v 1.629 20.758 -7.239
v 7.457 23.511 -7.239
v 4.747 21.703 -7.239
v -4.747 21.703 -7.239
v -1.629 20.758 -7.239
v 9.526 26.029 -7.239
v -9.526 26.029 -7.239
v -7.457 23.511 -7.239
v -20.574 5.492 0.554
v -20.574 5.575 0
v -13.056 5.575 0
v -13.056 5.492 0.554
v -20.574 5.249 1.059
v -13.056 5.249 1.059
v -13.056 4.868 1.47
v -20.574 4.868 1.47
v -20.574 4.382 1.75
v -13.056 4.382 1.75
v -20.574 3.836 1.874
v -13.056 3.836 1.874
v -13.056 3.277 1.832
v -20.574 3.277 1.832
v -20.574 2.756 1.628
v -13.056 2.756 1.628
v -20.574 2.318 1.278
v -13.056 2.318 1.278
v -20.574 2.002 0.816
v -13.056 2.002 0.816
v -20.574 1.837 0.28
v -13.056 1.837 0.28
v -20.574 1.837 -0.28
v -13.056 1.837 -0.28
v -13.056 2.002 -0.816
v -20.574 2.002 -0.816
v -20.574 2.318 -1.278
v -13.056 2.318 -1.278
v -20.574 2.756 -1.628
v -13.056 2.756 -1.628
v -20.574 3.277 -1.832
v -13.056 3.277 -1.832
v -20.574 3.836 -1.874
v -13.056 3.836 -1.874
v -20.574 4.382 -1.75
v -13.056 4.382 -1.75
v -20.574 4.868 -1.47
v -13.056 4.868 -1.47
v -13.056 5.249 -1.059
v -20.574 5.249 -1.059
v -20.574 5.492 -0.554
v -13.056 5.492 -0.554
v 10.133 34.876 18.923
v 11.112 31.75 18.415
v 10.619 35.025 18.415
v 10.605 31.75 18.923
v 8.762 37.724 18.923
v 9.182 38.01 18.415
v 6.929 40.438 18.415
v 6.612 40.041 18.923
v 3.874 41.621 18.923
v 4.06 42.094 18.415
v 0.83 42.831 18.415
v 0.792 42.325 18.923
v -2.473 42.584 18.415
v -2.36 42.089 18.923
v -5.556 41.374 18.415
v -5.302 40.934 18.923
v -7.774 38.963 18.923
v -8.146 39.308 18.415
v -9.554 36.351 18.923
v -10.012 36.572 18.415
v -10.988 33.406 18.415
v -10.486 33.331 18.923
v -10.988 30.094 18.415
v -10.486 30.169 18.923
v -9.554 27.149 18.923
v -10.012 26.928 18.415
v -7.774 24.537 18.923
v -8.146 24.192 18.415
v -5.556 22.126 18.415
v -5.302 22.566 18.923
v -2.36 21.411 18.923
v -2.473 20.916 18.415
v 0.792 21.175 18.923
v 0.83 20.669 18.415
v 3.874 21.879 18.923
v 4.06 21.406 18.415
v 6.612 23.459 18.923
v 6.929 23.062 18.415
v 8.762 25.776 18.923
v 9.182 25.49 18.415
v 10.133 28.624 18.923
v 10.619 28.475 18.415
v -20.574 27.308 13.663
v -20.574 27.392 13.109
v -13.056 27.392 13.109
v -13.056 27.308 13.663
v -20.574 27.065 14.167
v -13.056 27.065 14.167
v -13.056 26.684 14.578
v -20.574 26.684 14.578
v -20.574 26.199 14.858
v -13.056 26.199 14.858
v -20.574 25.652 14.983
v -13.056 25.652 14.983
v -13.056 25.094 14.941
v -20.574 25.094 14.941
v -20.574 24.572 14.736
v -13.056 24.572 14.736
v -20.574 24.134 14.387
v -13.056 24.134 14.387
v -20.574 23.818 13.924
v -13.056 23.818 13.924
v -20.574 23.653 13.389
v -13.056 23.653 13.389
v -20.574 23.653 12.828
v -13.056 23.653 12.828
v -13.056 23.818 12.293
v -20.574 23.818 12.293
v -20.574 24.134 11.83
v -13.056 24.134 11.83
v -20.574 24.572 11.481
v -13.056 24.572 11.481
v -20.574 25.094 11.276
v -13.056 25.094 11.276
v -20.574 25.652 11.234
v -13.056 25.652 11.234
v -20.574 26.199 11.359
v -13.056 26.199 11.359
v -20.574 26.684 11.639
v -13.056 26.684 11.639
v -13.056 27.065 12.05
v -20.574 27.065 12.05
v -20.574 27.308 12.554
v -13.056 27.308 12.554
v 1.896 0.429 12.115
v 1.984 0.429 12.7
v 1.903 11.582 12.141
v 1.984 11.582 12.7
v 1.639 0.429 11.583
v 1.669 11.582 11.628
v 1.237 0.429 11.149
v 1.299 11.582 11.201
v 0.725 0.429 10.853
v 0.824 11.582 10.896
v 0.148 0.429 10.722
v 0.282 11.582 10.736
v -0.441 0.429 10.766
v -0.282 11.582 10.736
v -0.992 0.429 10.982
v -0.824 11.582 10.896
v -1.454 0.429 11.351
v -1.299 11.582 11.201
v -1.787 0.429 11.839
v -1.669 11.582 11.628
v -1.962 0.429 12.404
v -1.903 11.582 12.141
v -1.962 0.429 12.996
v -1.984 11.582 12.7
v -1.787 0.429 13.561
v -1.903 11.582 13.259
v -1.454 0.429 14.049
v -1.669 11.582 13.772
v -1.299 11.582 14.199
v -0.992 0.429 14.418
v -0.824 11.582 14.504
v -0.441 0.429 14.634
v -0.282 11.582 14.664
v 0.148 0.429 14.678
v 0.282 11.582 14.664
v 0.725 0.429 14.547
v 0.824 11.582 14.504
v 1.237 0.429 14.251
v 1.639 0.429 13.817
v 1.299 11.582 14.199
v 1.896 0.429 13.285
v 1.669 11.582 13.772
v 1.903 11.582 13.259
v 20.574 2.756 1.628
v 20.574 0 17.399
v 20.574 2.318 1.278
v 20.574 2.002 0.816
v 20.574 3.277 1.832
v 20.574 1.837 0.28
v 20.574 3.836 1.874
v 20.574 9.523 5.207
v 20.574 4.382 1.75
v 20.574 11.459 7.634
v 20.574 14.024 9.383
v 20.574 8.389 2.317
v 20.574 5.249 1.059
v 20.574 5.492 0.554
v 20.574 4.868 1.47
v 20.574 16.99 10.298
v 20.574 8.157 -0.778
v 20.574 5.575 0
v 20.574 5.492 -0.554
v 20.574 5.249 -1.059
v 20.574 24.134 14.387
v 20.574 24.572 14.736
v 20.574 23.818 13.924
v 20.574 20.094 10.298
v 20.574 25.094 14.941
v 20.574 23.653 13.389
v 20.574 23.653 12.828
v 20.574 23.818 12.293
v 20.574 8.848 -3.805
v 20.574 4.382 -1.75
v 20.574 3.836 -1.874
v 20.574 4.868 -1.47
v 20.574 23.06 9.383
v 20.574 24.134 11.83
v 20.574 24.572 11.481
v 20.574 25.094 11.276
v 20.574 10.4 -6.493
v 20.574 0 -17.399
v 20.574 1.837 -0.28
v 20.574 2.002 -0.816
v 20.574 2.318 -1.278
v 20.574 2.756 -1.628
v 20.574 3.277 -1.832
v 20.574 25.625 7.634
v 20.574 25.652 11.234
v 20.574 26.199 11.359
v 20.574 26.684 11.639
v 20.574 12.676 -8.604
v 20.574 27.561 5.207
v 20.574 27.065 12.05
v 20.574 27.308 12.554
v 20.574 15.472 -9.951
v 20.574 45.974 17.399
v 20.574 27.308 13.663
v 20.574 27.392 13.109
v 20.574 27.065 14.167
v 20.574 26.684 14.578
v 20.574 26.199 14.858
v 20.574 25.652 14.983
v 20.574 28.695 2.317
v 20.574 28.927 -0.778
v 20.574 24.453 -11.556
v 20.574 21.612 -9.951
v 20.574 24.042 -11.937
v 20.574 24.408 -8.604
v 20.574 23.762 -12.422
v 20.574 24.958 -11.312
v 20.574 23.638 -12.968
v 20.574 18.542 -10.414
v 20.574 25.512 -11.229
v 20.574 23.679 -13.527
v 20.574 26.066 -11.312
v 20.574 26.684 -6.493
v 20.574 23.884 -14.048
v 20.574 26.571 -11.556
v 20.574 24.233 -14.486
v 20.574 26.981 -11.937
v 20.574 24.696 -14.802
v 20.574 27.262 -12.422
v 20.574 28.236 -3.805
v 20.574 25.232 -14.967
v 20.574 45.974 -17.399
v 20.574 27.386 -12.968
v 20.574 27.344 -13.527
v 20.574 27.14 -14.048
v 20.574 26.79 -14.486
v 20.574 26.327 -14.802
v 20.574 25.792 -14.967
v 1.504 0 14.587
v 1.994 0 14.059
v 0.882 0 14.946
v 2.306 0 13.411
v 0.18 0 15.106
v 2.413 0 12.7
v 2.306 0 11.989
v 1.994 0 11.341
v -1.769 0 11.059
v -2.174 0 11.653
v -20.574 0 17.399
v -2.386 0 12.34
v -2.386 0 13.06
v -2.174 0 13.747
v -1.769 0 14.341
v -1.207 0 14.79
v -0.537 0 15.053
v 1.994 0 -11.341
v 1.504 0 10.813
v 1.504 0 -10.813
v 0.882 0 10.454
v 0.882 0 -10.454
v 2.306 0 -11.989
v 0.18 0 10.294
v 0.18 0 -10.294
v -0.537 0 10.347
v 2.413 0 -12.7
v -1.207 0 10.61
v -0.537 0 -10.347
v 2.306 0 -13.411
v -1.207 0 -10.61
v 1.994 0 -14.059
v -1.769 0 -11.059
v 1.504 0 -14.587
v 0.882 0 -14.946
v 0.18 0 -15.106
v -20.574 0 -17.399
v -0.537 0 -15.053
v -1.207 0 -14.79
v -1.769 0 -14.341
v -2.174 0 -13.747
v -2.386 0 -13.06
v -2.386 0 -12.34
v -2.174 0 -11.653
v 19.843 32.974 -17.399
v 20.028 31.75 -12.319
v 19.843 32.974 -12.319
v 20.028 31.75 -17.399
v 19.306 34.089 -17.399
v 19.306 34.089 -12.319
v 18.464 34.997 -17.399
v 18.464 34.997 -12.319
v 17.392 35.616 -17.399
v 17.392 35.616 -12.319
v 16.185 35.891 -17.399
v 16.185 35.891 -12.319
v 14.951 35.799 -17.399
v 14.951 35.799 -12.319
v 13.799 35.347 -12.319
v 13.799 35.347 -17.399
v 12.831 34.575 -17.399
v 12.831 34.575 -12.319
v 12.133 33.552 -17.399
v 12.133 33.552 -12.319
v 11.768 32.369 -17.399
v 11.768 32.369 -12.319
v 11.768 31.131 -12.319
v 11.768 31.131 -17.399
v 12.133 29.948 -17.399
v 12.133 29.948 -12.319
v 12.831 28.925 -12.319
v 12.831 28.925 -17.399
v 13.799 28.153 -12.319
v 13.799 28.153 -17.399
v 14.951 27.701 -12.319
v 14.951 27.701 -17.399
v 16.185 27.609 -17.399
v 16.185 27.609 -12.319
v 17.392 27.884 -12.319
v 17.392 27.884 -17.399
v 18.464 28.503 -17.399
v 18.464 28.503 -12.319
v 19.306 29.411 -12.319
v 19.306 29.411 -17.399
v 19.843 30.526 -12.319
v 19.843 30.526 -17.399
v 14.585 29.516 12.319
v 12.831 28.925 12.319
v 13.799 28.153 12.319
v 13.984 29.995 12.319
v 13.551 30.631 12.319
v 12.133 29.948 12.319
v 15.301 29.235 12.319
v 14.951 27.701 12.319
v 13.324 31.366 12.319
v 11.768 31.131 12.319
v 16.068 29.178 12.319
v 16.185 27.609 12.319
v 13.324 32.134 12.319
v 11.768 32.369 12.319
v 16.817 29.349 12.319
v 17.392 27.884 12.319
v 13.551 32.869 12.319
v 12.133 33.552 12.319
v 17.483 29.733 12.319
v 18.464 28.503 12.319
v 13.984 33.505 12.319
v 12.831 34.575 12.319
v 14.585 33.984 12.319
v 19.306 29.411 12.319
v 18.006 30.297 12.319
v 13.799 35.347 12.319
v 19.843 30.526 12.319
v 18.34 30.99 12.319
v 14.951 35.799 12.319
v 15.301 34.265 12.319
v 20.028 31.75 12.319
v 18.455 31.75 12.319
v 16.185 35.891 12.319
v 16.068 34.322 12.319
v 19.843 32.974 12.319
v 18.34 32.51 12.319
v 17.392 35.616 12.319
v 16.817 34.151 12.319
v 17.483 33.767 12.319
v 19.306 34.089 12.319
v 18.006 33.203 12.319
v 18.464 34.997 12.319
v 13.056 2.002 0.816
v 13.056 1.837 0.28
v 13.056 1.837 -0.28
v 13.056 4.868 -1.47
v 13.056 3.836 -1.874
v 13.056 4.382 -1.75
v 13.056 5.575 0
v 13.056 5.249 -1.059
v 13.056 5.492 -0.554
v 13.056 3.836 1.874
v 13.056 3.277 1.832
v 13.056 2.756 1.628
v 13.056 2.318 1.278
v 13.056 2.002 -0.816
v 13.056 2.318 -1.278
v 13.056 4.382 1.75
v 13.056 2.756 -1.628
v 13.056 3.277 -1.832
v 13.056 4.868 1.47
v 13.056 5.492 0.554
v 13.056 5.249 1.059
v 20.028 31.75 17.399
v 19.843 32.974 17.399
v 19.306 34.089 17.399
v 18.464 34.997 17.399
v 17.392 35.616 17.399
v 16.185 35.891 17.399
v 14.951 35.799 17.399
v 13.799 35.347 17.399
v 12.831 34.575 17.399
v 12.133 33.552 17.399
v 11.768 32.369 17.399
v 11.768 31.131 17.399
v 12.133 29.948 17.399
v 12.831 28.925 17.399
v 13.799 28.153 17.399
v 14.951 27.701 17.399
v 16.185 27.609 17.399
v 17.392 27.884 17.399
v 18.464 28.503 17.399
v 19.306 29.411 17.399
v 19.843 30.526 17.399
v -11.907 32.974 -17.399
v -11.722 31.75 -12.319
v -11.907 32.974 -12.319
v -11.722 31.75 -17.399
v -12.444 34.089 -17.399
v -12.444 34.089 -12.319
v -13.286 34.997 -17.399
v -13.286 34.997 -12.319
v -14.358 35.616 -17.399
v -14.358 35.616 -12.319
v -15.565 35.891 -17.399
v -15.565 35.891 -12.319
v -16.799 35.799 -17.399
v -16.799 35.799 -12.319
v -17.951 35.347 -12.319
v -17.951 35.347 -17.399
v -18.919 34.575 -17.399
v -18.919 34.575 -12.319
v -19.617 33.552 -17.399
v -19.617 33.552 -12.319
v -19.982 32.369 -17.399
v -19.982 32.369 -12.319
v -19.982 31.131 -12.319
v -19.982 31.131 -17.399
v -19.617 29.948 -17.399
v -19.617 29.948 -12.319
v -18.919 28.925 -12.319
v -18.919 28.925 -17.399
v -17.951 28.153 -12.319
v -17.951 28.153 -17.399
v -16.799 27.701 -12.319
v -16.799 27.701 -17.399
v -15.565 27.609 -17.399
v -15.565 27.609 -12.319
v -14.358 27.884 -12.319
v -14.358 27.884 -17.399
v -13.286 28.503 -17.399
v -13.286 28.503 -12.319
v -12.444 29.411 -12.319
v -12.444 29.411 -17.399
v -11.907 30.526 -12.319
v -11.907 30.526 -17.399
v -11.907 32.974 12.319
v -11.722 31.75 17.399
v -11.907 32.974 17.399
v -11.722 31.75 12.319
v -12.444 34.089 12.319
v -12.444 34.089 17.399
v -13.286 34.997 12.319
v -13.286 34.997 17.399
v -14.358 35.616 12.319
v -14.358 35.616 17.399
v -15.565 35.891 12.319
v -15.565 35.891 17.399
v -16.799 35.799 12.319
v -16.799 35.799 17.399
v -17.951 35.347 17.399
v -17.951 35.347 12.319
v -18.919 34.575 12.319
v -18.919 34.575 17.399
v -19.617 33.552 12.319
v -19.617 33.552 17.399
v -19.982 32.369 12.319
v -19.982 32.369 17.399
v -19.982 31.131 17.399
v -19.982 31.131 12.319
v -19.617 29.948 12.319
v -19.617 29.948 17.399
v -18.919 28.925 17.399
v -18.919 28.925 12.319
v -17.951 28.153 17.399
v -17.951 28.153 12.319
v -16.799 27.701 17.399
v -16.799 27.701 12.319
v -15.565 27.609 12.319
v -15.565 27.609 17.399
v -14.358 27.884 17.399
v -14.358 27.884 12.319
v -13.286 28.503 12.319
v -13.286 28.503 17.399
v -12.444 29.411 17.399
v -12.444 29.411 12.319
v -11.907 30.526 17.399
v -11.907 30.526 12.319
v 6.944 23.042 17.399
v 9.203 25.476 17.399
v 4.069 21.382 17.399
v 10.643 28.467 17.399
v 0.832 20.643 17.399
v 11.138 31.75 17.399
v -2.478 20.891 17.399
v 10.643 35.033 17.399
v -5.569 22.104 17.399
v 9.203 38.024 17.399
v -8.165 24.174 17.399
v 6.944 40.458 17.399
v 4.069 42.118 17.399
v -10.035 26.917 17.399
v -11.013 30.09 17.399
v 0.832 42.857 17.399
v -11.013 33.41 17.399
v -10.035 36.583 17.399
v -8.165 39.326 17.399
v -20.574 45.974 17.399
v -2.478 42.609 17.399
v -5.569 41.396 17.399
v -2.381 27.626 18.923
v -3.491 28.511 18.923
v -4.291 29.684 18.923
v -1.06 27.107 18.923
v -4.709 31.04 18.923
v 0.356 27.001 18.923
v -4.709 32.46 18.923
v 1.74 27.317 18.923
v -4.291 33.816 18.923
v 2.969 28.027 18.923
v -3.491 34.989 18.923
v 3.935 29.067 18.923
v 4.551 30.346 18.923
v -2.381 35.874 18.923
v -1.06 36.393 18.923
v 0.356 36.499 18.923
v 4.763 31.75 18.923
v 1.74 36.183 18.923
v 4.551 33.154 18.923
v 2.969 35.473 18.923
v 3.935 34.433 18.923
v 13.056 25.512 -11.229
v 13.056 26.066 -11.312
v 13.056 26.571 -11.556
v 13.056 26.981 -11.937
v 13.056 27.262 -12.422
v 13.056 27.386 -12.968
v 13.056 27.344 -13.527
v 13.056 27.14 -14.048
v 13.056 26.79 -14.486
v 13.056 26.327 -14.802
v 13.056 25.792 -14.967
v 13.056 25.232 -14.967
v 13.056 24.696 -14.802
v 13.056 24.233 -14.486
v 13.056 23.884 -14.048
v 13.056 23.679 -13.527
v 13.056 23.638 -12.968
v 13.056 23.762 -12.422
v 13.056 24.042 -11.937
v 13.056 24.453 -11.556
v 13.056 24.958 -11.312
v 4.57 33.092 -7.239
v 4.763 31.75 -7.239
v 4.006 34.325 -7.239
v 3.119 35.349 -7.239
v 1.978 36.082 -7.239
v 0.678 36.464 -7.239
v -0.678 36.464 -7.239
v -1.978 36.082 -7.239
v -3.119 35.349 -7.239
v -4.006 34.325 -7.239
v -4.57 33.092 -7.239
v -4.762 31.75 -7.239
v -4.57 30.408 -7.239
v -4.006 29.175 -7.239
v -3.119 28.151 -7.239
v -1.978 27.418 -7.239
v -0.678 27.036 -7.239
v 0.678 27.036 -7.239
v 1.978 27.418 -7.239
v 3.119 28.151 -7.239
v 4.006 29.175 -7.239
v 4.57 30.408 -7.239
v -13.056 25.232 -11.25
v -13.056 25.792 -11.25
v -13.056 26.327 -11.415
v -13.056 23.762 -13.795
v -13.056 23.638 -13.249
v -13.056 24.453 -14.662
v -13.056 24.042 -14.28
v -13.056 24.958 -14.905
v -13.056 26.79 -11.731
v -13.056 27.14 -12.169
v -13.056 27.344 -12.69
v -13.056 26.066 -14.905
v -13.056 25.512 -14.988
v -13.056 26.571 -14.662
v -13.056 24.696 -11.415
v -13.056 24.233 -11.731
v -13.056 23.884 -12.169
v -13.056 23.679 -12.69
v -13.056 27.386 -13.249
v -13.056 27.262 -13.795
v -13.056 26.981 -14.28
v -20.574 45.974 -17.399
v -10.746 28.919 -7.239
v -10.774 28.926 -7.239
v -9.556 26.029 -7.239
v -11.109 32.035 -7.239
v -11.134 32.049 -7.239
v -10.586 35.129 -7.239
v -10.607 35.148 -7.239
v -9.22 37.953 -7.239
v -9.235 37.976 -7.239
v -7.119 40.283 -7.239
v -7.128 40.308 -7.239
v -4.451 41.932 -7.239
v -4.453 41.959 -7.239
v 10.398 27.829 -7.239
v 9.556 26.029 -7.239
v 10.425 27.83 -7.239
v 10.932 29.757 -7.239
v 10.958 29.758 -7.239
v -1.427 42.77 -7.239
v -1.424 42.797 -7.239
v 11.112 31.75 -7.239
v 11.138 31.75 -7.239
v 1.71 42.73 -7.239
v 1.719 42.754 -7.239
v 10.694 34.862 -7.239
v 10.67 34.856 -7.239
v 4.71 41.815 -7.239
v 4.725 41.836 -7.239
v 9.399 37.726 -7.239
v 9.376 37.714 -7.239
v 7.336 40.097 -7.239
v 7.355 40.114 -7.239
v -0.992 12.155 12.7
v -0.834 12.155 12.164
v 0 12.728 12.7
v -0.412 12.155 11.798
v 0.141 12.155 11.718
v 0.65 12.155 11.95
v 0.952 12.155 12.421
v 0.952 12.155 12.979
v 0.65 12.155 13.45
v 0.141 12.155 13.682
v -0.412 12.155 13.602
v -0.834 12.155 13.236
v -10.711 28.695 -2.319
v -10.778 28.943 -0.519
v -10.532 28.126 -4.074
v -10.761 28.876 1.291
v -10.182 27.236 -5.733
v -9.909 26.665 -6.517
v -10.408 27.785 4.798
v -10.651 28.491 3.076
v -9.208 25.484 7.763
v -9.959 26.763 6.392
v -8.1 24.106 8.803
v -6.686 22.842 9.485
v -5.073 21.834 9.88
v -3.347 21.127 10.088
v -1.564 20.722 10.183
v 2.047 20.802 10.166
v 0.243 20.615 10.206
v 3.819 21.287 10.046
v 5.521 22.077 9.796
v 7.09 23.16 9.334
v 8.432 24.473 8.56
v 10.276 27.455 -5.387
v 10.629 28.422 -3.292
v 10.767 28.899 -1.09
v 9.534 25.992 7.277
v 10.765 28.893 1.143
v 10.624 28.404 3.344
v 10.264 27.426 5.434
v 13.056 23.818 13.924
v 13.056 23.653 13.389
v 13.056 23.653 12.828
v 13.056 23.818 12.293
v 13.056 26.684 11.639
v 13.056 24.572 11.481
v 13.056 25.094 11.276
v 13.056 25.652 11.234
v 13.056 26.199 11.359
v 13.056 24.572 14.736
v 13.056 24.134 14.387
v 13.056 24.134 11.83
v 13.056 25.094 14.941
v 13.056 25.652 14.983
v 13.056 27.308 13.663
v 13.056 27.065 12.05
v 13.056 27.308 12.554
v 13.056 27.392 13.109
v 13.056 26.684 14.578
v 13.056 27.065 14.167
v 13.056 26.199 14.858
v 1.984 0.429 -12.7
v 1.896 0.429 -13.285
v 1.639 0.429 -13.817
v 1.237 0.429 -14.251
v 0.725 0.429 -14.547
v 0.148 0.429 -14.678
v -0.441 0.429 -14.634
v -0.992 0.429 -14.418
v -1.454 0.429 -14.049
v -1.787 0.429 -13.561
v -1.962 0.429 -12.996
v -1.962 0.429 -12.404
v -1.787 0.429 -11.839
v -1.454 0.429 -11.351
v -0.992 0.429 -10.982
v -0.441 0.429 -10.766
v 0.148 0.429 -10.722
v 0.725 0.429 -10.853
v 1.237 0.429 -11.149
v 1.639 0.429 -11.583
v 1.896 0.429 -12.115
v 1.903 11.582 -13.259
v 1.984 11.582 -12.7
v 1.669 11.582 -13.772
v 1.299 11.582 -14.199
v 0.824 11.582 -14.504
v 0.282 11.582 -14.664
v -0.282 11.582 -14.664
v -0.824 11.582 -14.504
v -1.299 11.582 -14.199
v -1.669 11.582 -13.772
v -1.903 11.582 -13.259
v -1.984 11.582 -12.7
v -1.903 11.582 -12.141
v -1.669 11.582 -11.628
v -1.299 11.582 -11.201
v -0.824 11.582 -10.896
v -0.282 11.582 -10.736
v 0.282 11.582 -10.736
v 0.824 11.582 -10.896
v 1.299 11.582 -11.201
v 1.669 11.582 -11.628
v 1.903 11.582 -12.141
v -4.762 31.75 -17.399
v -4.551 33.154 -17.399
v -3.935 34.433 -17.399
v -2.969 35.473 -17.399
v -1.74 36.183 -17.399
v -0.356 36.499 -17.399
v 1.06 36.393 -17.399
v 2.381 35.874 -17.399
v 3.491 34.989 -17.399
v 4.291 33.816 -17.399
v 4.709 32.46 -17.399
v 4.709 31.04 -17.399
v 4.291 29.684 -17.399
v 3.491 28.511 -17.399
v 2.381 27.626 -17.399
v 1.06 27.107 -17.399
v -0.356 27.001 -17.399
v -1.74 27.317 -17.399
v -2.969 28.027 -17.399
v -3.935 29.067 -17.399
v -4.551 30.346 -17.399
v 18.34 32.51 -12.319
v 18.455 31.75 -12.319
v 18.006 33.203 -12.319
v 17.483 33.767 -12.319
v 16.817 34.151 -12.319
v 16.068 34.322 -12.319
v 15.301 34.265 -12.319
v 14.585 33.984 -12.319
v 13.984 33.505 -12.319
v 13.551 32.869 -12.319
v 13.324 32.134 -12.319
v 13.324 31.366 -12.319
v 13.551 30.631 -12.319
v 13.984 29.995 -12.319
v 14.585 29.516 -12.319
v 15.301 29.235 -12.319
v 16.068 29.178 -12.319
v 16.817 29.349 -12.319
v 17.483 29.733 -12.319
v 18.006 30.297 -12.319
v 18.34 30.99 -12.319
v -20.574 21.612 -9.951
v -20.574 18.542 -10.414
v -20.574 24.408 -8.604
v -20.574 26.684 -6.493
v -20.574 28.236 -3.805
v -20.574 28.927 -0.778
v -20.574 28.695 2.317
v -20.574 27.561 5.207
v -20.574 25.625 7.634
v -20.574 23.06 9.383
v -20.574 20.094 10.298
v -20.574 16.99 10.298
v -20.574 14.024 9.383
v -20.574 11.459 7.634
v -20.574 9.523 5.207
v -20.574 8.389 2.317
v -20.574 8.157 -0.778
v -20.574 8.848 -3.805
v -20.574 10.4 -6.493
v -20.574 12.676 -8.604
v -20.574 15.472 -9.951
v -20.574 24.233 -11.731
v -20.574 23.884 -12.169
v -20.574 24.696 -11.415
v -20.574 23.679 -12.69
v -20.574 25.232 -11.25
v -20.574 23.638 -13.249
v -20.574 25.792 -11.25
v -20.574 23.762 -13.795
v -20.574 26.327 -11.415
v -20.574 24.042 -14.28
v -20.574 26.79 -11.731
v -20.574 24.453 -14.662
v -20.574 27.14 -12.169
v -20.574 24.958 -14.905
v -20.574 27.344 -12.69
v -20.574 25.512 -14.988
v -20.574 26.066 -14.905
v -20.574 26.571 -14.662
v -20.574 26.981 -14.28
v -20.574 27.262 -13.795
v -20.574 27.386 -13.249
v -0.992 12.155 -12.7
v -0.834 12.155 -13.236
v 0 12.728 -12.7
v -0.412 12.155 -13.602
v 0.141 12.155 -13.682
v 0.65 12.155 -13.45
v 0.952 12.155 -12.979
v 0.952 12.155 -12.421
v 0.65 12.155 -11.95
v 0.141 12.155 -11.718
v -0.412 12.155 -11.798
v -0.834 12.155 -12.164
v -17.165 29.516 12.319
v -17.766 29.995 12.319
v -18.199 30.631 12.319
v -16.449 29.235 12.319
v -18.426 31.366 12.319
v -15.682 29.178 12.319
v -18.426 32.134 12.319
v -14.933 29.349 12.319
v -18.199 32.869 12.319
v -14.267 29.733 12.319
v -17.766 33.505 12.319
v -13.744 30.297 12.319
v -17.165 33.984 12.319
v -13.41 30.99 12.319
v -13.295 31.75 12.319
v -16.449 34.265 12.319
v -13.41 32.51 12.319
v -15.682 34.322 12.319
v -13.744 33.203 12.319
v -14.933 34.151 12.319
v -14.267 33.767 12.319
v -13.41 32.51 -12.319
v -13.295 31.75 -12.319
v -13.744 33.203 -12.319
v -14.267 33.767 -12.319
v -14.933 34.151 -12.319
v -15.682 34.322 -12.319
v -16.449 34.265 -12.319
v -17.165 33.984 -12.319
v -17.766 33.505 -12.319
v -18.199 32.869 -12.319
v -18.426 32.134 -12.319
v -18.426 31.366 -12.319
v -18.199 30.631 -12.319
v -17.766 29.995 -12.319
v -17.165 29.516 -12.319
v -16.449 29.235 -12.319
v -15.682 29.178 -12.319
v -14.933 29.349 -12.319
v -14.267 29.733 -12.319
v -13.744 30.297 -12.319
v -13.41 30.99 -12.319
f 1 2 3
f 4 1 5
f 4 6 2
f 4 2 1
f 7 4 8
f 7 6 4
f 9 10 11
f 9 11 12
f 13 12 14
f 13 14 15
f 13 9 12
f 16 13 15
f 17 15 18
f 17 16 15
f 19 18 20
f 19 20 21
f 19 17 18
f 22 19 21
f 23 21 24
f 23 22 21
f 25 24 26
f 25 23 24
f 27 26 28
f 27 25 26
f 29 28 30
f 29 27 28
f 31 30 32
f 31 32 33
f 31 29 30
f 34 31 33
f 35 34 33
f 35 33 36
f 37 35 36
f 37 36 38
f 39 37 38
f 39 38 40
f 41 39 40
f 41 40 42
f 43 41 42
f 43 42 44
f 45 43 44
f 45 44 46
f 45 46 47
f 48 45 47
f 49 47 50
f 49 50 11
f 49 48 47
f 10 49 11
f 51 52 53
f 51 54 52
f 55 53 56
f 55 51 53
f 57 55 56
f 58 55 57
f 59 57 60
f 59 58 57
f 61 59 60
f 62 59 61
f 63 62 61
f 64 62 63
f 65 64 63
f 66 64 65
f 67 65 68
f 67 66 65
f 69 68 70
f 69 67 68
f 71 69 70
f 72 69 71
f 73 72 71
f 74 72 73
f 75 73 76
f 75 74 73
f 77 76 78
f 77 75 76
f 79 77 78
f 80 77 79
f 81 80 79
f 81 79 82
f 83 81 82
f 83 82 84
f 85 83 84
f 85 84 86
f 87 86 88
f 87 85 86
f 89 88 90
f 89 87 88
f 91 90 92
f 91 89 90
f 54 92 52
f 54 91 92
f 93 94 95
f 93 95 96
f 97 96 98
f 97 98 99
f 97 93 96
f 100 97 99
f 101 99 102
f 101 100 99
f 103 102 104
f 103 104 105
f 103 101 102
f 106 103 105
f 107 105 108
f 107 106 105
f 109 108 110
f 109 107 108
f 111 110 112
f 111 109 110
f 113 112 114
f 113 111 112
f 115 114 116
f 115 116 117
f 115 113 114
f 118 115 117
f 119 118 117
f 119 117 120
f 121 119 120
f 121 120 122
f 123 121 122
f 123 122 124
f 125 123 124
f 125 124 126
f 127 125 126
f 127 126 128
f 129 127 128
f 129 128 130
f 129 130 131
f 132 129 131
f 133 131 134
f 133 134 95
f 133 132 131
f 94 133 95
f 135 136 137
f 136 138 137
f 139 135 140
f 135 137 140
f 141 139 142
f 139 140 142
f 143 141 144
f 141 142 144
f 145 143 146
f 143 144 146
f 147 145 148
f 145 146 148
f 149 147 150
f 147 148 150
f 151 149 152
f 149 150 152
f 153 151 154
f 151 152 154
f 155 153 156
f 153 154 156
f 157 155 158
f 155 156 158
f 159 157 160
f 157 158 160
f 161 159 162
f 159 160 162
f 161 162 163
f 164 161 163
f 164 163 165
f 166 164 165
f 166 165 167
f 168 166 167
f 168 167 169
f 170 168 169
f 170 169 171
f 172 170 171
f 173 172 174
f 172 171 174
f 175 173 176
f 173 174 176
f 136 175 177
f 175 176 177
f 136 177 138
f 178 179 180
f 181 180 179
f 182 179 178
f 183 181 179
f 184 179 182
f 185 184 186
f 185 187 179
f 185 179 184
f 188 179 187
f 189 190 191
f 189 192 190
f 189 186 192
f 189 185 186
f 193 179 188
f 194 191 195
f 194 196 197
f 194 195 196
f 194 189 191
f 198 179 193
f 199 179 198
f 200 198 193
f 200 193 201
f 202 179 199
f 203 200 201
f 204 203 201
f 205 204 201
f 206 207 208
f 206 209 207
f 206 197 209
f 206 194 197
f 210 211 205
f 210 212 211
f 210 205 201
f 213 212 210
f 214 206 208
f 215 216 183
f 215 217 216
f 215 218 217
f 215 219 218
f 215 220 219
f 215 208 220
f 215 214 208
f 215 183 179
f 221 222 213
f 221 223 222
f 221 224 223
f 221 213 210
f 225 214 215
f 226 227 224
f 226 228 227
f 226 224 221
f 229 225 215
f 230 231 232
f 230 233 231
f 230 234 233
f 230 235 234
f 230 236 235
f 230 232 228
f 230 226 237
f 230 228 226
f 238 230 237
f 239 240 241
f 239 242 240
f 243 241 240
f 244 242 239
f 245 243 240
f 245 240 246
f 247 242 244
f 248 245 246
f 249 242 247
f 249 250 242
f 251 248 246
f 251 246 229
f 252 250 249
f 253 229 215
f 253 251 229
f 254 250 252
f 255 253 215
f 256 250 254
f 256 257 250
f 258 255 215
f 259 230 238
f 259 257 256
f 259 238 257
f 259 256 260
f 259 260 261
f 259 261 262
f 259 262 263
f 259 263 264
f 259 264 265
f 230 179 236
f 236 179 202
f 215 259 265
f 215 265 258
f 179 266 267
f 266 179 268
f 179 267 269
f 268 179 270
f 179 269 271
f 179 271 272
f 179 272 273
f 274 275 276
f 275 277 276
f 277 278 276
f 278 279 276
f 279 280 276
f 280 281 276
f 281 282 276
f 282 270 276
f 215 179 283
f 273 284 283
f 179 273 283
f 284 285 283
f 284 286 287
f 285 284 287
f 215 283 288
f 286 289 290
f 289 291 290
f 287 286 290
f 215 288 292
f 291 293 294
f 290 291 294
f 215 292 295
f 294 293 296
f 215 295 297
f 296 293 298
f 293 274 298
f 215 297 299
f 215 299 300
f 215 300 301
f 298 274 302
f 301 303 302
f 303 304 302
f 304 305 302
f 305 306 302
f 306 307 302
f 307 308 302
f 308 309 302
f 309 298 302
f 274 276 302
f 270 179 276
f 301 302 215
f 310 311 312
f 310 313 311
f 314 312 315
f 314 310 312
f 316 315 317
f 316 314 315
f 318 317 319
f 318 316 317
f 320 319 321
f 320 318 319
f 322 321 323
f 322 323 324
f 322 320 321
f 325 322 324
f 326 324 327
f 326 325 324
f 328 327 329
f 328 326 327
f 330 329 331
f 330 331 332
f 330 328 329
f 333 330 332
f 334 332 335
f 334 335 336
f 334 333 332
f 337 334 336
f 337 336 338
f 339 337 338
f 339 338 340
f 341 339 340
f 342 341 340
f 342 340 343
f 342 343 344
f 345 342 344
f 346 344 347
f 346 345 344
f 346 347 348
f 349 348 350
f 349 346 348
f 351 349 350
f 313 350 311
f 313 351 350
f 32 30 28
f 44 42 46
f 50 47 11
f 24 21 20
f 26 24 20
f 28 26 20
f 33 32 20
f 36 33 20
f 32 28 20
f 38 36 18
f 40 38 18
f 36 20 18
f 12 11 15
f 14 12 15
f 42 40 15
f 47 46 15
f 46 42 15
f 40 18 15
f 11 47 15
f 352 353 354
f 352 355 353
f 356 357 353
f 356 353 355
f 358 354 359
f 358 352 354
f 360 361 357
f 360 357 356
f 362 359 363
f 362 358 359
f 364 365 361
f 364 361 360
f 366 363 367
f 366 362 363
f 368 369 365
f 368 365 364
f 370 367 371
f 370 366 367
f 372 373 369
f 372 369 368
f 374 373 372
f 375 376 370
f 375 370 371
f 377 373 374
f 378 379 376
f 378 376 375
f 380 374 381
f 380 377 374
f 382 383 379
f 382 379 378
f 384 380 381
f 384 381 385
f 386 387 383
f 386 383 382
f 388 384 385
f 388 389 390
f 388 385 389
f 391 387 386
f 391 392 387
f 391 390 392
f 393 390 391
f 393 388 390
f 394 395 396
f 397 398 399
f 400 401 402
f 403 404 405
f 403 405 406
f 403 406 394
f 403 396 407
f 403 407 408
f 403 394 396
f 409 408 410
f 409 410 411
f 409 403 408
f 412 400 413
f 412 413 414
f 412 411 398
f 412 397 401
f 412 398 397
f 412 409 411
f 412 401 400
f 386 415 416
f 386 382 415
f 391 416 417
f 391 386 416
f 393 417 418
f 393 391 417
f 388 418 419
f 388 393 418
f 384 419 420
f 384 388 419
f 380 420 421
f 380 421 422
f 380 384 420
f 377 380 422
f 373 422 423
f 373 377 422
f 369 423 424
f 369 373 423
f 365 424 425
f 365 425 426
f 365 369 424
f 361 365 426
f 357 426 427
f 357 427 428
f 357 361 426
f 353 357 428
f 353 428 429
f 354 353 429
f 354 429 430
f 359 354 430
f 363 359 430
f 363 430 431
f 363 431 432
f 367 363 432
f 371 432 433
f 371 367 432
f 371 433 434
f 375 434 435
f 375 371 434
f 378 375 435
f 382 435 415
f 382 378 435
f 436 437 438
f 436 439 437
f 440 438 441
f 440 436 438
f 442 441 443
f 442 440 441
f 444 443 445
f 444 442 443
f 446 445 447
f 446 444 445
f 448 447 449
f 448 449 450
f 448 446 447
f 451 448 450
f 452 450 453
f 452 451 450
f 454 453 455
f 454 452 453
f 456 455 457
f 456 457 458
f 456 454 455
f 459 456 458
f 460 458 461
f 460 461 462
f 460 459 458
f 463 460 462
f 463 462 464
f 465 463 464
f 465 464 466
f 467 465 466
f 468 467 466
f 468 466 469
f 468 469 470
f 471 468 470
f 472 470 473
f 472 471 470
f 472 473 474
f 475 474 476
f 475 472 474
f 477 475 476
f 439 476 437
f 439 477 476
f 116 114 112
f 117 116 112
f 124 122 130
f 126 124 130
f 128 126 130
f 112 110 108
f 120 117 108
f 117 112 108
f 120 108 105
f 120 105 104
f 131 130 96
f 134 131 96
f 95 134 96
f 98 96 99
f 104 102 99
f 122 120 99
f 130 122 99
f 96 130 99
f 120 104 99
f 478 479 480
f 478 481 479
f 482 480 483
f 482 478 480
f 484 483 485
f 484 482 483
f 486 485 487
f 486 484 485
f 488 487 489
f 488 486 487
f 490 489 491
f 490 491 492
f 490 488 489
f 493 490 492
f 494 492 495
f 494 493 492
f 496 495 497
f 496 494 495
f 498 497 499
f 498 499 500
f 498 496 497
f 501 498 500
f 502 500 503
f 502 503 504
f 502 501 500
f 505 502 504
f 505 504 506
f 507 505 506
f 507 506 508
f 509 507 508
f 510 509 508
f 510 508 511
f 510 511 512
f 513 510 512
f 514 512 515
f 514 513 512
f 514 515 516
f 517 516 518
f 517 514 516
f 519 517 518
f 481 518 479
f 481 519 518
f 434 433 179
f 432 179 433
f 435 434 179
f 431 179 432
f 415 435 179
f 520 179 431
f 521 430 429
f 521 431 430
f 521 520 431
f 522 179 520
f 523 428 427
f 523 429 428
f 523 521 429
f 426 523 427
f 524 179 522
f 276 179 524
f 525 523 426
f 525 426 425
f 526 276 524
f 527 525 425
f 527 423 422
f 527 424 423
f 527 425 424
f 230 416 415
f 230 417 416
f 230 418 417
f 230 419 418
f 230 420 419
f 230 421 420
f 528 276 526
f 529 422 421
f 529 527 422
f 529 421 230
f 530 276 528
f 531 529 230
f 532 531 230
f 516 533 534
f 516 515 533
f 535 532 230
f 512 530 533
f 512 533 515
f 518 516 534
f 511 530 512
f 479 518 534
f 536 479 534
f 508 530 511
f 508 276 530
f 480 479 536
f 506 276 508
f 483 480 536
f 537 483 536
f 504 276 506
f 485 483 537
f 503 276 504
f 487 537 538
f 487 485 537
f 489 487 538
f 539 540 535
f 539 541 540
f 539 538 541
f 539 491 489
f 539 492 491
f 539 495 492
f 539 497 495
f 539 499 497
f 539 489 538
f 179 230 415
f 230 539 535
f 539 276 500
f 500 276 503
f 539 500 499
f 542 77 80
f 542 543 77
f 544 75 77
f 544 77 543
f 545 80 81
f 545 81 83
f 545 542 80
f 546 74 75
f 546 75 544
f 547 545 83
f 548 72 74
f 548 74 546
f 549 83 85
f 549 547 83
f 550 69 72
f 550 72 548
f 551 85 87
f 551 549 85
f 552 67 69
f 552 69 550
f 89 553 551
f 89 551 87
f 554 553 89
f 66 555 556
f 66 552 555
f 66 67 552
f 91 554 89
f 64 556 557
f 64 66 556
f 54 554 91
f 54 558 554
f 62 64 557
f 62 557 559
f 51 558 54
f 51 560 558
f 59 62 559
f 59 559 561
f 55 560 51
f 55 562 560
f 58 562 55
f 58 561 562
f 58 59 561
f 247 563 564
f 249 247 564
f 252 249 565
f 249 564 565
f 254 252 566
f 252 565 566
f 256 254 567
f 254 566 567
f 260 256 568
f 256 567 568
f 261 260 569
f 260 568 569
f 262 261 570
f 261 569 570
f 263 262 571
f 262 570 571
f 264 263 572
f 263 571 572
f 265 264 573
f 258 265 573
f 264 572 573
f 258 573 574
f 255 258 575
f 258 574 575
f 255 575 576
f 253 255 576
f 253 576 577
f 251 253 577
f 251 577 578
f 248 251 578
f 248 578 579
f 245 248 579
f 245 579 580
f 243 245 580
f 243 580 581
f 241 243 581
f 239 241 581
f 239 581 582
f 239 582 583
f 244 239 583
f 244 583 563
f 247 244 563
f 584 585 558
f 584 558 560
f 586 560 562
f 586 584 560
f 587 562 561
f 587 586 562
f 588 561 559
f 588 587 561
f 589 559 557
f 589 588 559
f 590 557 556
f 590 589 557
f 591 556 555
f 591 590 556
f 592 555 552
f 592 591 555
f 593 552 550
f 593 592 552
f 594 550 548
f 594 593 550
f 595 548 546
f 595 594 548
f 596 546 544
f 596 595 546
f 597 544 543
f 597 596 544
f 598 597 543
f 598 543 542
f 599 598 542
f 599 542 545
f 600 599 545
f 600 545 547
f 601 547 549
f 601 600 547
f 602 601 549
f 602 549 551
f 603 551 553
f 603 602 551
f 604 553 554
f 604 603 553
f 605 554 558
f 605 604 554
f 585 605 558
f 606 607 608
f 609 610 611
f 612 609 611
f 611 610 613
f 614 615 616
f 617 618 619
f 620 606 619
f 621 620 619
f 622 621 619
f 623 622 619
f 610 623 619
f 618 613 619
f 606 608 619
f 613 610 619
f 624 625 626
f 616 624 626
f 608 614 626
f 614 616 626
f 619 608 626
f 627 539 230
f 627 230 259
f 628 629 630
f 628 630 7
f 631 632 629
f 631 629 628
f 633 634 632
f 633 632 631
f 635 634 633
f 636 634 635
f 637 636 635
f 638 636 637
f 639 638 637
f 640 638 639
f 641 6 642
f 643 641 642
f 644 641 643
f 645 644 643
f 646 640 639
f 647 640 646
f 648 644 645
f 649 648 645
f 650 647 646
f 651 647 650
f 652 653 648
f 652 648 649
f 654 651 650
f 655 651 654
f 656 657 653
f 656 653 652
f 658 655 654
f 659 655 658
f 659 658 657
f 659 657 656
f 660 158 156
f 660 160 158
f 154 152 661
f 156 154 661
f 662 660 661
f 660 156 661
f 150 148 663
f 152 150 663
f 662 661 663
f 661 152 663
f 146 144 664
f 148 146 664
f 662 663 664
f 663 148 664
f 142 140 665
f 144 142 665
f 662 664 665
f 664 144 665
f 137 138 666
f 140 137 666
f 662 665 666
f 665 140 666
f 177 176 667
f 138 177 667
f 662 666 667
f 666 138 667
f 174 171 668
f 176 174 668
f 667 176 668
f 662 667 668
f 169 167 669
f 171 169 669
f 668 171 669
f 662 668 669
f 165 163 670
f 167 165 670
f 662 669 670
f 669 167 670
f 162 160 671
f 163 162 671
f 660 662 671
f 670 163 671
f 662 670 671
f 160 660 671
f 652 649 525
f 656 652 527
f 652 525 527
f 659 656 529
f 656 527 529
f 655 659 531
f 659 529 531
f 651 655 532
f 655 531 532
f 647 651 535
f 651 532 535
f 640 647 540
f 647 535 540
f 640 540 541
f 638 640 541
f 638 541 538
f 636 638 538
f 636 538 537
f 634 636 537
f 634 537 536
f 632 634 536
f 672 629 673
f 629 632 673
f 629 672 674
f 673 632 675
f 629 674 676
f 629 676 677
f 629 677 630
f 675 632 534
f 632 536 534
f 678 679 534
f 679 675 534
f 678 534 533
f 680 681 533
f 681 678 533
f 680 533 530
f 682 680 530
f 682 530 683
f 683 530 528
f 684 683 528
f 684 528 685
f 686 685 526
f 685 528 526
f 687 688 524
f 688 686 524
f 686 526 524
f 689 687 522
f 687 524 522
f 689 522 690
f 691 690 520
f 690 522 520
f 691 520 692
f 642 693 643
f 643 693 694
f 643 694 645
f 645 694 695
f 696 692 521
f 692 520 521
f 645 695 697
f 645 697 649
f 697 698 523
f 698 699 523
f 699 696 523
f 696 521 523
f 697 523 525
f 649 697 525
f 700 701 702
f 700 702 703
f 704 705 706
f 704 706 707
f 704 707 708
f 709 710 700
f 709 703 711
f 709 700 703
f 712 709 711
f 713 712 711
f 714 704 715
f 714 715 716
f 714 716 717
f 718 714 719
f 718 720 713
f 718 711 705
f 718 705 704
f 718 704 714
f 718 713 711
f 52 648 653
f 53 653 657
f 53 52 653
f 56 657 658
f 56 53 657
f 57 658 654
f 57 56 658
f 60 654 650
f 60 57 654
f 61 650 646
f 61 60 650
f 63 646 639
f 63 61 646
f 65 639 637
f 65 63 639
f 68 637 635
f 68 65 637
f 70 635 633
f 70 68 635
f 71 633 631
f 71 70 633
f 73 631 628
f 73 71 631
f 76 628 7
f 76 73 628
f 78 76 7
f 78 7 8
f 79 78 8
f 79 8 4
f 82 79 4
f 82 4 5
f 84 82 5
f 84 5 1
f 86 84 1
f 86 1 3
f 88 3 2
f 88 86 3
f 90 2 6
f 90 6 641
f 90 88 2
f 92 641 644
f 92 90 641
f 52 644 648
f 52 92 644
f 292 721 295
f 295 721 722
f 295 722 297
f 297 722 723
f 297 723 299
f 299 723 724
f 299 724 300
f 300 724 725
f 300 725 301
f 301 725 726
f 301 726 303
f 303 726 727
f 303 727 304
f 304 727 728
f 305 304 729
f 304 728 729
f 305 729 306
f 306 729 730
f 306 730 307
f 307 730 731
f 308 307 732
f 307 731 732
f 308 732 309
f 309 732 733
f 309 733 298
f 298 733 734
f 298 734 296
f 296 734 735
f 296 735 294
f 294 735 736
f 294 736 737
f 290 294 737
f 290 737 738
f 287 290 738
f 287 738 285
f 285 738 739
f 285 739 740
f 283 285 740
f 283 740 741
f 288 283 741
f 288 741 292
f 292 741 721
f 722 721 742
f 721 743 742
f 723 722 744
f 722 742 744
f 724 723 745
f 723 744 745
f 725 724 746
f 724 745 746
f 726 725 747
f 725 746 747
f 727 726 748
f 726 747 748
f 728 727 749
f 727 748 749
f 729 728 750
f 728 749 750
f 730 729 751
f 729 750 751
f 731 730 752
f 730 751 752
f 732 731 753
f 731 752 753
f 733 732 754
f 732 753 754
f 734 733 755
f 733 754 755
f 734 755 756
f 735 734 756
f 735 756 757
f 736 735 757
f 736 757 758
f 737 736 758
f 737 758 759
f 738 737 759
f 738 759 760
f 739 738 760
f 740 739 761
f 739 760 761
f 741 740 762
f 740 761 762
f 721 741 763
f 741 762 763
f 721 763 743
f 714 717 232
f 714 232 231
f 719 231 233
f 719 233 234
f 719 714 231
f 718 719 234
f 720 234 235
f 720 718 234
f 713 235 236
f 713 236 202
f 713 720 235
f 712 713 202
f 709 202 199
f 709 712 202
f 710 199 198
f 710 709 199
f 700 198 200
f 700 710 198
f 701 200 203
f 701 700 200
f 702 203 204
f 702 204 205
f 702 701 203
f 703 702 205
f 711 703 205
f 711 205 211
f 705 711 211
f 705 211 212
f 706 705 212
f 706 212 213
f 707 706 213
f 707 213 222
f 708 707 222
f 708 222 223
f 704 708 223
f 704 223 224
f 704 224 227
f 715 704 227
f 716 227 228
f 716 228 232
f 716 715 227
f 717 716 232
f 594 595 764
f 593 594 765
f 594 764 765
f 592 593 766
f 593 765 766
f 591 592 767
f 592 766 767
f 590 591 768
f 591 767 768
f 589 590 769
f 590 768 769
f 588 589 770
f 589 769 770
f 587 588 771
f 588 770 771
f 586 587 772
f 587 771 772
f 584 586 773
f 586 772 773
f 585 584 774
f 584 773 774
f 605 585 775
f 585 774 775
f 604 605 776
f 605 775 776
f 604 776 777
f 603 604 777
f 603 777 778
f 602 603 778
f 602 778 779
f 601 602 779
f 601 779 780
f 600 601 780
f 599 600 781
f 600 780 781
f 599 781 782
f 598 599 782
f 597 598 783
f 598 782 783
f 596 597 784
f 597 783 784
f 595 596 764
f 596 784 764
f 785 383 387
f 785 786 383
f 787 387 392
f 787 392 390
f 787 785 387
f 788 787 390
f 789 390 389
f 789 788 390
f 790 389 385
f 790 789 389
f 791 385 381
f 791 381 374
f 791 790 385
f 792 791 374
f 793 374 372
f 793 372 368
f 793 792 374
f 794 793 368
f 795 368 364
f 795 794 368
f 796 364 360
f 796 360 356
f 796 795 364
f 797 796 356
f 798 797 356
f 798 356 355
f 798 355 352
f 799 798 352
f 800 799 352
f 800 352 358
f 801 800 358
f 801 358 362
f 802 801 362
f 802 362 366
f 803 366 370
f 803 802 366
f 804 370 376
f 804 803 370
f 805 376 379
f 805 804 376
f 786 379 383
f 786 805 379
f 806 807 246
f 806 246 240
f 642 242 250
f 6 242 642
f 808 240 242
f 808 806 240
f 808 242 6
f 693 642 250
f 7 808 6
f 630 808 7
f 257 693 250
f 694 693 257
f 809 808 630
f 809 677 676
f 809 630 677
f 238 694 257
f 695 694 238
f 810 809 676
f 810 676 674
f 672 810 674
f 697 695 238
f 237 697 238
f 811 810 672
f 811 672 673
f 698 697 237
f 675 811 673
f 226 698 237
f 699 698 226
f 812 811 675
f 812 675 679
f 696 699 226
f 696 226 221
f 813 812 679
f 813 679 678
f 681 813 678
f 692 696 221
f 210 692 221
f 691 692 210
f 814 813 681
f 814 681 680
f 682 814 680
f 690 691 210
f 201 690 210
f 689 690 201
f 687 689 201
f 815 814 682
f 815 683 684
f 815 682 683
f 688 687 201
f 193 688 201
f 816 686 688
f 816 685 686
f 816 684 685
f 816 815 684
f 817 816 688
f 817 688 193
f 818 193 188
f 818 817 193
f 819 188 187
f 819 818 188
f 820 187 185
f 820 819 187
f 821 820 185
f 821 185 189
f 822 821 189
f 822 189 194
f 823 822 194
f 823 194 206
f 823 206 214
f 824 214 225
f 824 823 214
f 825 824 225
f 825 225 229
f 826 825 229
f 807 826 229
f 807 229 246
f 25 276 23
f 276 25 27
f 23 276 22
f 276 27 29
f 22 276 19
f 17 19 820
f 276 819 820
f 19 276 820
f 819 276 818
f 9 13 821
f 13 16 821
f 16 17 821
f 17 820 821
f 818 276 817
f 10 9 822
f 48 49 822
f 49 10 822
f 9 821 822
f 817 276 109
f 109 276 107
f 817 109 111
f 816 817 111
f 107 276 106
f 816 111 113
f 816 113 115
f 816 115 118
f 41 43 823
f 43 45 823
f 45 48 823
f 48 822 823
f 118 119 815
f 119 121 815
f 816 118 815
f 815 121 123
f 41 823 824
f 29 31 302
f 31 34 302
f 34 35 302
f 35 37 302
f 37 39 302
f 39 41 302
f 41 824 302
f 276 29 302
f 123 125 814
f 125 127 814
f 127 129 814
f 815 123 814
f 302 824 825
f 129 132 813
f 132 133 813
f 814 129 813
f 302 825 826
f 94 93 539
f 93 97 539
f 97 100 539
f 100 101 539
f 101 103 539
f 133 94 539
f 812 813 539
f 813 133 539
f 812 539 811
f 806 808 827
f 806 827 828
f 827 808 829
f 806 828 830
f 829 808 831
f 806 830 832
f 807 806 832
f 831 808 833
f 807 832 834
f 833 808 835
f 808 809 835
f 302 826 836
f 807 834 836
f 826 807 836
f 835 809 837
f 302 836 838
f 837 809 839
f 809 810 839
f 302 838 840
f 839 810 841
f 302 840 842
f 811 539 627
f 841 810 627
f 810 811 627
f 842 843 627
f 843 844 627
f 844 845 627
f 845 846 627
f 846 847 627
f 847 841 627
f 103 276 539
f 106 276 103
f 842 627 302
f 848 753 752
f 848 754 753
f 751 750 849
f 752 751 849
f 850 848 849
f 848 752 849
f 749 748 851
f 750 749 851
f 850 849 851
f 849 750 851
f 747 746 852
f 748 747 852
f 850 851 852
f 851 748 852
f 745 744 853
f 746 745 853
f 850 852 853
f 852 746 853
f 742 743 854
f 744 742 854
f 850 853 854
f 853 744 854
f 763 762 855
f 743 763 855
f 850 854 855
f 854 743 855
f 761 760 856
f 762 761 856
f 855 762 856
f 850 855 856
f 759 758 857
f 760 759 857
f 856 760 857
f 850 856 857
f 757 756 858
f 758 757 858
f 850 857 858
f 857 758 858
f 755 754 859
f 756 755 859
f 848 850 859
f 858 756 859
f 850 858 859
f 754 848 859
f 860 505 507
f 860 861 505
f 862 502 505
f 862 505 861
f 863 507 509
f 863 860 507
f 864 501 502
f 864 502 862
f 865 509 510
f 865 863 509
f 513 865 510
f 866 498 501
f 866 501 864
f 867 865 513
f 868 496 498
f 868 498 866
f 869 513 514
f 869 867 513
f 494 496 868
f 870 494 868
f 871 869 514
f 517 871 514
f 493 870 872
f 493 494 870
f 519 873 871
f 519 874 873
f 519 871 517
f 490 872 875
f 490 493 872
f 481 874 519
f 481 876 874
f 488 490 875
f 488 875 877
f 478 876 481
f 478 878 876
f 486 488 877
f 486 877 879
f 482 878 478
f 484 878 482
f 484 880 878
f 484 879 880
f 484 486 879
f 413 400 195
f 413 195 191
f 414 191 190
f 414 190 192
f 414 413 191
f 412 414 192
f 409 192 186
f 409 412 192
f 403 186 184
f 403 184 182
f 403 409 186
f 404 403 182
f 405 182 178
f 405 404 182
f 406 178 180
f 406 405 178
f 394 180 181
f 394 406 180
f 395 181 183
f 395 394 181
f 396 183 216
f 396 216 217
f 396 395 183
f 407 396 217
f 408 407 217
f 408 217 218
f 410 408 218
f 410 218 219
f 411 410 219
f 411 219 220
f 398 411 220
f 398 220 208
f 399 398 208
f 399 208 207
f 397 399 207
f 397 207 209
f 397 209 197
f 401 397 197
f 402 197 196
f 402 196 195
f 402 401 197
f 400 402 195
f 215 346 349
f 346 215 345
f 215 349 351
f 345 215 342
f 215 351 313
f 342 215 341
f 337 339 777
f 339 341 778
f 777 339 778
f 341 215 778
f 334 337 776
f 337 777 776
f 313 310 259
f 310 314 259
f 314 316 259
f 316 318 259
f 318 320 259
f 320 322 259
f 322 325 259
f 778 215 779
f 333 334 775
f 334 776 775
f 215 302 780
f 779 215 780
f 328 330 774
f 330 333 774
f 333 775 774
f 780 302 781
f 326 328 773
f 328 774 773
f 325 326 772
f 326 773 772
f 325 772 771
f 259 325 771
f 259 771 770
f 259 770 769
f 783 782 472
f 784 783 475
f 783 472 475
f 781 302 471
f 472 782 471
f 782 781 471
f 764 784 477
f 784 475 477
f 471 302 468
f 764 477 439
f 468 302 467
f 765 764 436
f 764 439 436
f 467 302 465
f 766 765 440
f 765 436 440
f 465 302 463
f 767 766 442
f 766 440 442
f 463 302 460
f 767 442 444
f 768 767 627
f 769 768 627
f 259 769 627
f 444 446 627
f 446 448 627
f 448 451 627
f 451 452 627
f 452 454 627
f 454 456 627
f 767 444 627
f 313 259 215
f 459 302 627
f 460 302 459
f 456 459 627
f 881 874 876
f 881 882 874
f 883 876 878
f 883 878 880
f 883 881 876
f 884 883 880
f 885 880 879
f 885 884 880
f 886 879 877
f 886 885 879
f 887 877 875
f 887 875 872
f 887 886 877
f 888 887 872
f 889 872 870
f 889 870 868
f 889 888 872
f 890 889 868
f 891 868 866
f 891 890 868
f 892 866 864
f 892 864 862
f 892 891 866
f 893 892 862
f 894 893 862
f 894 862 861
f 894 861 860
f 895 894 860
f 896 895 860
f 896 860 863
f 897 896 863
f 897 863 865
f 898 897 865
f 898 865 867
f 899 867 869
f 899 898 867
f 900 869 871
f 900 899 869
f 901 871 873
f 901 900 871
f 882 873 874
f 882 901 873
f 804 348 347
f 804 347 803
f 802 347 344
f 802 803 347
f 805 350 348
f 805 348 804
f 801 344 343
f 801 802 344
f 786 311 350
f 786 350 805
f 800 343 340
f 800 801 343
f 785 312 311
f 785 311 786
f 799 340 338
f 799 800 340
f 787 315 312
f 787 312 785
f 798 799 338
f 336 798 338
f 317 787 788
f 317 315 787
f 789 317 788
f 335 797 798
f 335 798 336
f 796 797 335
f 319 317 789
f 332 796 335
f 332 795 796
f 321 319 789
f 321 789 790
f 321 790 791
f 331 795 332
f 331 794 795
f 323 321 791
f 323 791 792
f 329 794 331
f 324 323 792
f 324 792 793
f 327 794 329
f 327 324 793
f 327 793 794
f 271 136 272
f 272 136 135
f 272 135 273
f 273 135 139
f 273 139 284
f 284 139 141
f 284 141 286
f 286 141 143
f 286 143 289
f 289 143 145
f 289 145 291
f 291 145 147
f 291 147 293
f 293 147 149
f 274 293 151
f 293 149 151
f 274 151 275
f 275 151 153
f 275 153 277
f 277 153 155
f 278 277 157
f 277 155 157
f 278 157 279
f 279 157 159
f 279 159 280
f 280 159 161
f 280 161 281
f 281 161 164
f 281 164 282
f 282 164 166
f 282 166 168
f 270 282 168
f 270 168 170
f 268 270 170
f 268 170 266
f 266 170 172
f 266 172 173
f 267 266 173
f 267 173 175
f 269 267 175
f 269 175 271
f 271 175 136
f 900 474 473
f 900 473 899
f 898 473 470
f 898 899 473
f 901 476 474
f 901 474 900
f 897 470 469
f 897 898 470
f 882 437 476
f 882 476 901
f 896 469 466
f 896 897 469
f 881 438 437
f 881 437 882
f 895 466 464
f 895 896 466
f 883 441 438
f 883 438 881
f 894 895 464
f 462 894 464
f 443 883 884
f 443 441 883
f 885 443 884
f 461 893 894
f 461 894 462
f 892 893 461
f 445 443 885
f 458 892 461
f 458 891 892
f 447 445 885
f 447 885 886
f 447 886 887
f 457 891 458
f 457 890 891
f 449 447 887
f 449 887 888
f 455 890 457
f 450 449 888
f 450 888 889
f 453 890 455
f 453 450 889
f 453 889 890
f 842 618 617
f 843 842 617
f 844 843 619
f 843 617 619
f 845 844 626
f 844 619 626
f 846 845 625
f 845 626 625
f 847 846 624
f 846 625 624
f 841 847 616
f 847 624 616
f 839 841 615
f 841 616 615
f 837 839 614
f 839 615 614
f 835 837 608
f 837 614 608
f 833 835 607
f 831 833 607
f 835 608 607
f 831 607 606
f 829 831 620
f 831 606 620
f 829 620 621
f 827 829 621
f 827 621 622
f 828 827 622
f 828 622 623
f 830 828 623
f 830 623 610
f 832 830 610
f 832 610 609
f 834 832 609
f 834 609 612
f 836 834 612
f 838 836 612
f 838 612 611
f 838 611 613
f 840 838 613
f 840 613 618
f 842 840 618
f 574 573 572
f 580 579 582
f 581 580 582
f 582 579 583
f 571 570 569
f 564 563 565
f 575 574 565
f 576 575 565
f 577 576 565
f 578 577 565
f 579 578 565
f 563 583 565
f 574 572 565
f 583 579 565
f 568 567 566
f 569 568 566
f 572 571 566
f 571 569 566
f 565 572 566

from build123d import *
from build123d.topology import SkipClean

# Parameters (mm, degrees)
BOSS_EXTRUDE1_DEPTH      = 20.574
BOSS_EXTRUDE1_DEPTH_BACK = 20.574
SKETCH1_W                = 34.798
SKETCH1_H                = 45.974
SKETCH1_R                = 10.414
HOLE1_D                  = 3.96748
HOLE1_DEPTH              = 11.5824
HOLE1_CSINK_D            = 4.826
HOLE1_CSINK_ANGLE        = 90
HOLE1_TIP                = 1.145312823
HOLE2_D                  = 3.96748
HOLE2_DEPTH              = 11.5824
HOLE2_CSINK_D            = 4.826
HOLE2_CSINK_ANGLE        = 90
HOLE2_TIP                = 1.145312823
HOLE3_D                  = 9.525
HOLE3_CBORE_D            = 22.2758
HOLE3_CBORE_DEPTH        = 24.638
HOLE4_D                  = 3.7592
HOLE4_DEPTH              = 7.5184
LPATTERN2_COUNT          = 2
LPATTERN2_PITCH          = 26.217009696
LPATTERN2_COUNT_DIR2     = 2
LPATTERN2_PITCH_DIR2     = 25.451525793
HOLE5_D                  = 3.7592
HOLE5_DEPTH              = 7.5184
LPATTERN4_COUNT          = 2
LPATTERN4_PITCH          = 26.217009696
LPATTERN4_COUNT_DIR2     = 2
LPATTERN4_PITCH_DIR2     = 25.451525793


with BuildPart() as part:
    # Sketch1 → Boss-Extrude1 (new, two sides: drawn at the far end of the back side and taken through both)
    with BuildSketch(Plane(origin=(0, 0, 0), x_dir=(0, 0, -1), z_dir=(1, 0, 0)).offset(-BOSS_EXTRUDE1_DEPTH_BACK)):
        with Locations((0, 22.987)):
            Rectangle(SKETCH1_W, SKETCH1_H)
        with Locations((0, 18.542)):
            Circle(SKETCH1_R, mode=Mode.SUBTRACT)
    extrude(amount=BOSS_EXTRUDE1_DEPTH + BOSS_EXTRUDE1_DEPTH_BACK)

    # Sketch2 → Cut-Revolve1 (revolve, cut)
    with BuildSketch(Plane(origin=(15.875, 0, 0), x_dir=(0, 0, -1), z_dir=(1, 0, 0))):
        Polygon((-17.399, 31.75), (-17.399, 35.9029), (-12.319, 35.9029), (-12.319, 34.3296875), (12.319, 34.3296875), (12.319, 35.9029), (17.399, 35.9029), (17.399, 31.75), align=None)
    revolve(axis=Axis((15.875, 31.75, -17.399), (0, 0, 1)), mode=Mode.SUBTRACT)

    # Sketch3 → Cut-Revolve2 (revolve, cut)
    with BuildSketch(Plane(origin=(-15.875, 0, 0), x_dir=(0, 0, -1), z_dir=(1, 0, 0))):
        Polygon((-17.399, 31.75), (-17.399, 35.9029), (-12.319, 35.9029), (-12.319, 34.3296875), (12.319, 34.3296875), (12.319, 35.9029), (17.399, 35.9029), (17.399, 31.75), align=None)
    revolve(axis=Axis((-15.875, 31.75, -17.399), (0, 0, 1)), mode=Mode.SUBTRACT)

    # Hole1
    with Locations(Plane(origin=(0, 0, 0), x_dir=(-1, 0, 0), z_dir=(0, -1, 0))):
        with Locations((0, -12.7)):
            CounterSinkHole(HOLE1_D / 2, HOLE1_CSINK_D / 2, depth=HOLE1_DEPTH, counter_sink_angle=HOLE1_CSINK_ANGLE)
            with Locations((0, 0, -(HOLE1_DEPTH + HOLE1_TIP / 2))):  # 120° drill point
                Cone(0, HOLE1_D / 2, HOLE1_TIP, mode=Mode.SUBTRACT)

    # Hole2
    with Locations(Plane(origin=(0, 0, 0), x_dir=(-1, 0, 0), z_dir=(0, -1, 0))):
        with Locations((0, 12.7)):
            CounterSinkHole(HOLE2_D / 2, HOLE2_CSINK_D / 2, depth=HOLE2_DEPTH, counter_sink_angle=HOLE2_CSINK_ANGLE)
            with Locations((0, 0, -(HOLE2_DEPTH + HOLE2_TIP / 2))):  # 120° drill point
                Cone(0, HOLE2_D / 2, HOLE2_TIP, mode=Mode.SUBTRACT)

    # Hole3 (through all)
    with Locations(Plane.XY.offset(17.399)):
        with Locations((0, 31.75)):
            CounterBoreHole(HOLE3_D / 2, HOLE3_CBORE_D / 2, HOLE3_CBORE_DEPTH)

    # Sketch10 → Revolve1 (revolve)
    with SkipClean():  # the faces are left unmerged after this step: merging them gives an invalid solid
        with BuildSketch(Plane(origin=(0, 0, 0), x_dir=(0, 0, -1), z_dir=(1, 0, 0))):
            Polygon((-18.923, 42.3545), (-18.923, 36.5125), (7.239, 36.5125), (7.239, 42.8625), (-18.415, 42.8625), align=None)
        revolve(axis=Axis((0, 31.75, -7.239), (0, 0, 1)))
    add(part.part.scale(1), mode=Mode.REPLACE)  # the faces are merged on a copy

    # Hole4
    with Locations(Plane(origin=(20.574, 0, 0), x_dir=(0, 0, -1), z_dir=(1, 0, 0))):
        with Locations((13.108504848, 25.511915663)):
            hole4 = Hole(HOLE4_D / 2, depth=HOLE4_DEPTH)

    # LPattern2: Hole4 2 × 2, 1 skipped
    with Locations(*[Vector(0, 0, 1) * (i * LPATTERN2_PITCH) + Vector(0, -0.8571673007021121, 0.5150380749100545) * (j * LPATTERN2_PITCH_DIR2) for i in range(LPATTERN2_COUNT) for j in range(LPATTERN2_COUNT_DIR2) if (i, j) not in ((0, 0), (1, 1))]):
        add(hole4, mode=Mode.SUBTRACT)

    # Hole5
    with Locations(Plane.ZY.offset(20.574)):
        with Locations((-13.108504848, 25.511915663)):
            hole5 = Hole(HOLE5_D / 2, depth=HOLE5_DEPTH)

    # LPattern4: Hole5 2 × 2, 1 skipped
    with Locations(*[Vector(0, 0, 1) * (i * LPATTERN4_PITCH) + Vector(0, -0.8571673007021121, 0.5150380749100545) * (j * LPATTERN4_PITCH_DIR2) for i in range(LPATTERN4_COUNT) for j in range(LPATTERN4_COUNT_DIR2) if (i, j) not in ((0, 0), (1, 1))]):
        add(hole5, mode=Mode.SUBTRACT)


solid = part.part
